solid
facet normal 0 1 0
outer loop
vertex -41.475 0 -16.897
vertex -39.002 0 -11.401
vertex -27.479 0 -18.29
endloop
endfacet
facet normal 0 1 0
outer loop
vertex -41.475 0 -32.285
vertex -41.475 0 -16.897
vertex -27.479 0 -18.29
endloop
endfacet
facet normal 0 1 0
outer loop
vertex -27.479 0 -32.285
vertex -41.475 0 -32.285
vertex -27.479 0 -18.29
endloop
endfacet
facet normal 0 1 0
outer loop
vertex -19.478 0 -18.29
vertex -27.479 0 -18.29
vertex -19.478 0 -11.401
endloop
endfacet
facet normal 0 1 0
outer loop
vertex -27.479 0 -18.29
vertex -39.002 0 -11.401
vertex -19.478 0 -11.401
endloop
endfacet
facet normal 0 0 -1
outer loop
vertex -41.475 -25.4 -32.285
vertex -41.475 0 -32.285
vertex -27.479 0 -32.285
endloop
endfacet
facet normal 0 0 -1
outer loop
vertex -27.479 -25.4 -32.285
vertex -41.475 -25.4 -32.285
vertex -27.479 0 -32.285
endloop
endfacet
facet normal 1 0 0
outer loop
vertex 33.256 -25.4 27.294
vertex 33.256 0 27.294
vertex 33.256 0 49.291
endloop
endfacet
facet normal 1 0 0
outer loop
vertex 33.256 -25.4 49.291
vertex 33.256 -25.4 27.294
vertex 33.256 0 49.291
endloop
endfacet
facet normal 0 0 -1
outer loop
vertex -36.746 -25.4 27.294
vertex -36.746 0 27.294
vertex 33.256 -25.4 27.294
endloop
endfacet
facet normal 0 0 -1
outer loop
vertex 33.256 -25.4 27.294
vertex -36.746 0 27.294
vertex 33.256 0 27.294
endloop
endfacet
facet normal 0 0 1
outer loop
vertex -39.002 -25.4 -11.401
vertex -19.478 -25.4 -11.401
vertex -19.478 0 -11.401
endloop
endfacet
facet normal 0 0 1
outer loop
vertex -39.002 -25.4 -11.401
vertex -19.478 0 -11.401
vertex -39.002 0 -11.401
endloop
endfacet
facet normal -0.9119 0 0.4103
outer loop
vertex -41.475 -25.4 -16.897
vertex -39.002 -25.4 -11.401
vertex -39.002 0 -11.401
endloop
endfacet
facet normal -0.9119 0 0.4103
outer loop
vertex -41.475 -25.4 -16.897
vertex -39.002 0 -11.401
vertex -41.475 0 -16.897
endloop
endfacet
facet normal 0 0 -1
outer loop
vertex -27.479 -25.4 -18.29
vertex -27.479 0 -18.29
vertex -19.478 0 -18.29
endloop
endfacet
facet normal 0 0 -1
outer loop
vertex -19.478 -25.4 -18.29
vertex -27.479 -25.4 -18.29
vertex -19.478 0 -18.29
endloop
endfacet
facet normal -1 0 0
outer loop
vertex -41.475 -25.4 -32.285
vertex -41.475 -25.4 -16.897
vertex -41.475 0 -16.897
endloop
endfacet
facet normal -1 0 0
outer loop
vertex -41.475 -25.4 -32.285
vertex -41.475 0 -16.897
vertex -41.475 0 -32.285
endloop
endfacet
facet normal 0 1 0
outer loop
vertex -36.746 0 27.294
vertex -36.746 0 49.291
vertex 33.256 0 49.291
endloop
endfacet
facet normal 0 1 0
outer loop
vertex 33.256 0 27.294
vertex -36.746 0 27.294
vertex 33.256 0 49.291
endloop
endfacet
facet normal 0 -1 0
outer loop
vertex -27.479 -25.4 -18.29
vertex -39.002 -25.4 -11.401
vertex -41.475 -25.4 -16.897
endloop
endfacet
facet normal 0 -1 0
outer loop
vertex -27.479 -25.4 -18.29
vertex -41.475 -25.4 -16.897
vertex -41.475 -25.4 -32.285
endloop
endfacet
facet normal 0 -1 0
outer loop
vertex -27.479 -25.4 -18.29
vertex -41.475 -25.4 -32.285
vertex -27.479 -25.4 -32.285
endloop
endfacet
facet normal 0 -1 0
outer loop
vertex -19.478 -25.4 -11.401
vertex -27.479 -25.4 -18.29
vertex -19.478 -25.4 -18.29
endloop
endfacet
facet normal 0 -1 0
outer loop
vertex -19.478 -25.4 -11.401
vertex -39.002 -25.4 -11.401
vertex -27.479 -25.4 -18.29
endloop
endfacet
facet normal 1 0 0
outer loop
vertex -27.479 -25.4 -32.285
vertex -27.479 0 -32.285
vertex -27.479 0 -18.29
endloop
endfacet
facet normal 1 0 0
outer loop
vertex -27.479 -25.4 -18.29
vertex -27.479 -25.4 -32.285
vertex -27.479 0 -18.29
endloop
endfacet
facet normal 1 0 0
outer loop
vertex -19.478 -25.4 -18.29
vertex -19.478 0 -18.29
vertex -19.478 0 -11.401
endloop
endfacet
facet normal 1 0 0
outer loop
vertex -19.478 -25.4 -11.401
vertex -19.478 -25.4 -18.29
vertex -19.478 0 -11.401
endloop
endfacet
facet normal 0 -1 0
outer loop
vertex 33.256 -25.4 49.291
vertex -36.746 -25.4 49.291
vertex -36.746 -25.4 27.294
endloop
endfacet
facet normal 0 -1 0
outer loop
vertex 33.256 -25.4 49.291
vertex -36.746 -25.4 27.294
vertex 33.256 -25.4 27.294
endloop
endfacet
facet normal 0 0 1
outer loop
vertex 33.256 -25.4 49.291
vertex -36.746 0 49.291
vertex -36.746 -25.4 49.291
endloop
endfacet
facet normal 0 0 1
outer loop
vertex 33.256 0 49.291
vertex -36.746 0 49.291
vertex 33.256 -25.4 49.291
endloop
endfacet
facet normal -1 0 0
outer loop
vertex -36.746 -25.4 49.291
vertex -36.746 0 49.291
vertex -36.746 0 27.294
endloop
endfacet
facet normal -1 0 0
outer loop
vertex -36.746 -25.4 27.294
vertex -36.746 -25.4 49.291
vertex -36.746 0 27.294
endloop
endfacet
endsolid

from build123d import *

# Parameters (mm, degrees)
F0_W     = 70.0024
F0_H     = 10.9982
F1_DEPTH = 25.4


with BuildPart() as f1:
    # F0 (on Front) → F1 (new body)
    with BuildSketch(Plane.XZ):
        with Locations((-1.745184, 43.791507)):
            Rectangle(F0_W, F0_H)
        with Locations((-1.745184, 32.793307)):
            Rectangle(F0_W, F0_H)
        Polygon((-39.001687, -11.400868), (-41.474836, -16.896756), (-41.474836, -32.285243), (-27.479436, -32.285243), (-27.479436, -18.289843), (-19.478436, -18.289843), (-19.478436, -11.400868), align=None)
    extrude(amount=F1_DEPTH)


solid = f1.part
